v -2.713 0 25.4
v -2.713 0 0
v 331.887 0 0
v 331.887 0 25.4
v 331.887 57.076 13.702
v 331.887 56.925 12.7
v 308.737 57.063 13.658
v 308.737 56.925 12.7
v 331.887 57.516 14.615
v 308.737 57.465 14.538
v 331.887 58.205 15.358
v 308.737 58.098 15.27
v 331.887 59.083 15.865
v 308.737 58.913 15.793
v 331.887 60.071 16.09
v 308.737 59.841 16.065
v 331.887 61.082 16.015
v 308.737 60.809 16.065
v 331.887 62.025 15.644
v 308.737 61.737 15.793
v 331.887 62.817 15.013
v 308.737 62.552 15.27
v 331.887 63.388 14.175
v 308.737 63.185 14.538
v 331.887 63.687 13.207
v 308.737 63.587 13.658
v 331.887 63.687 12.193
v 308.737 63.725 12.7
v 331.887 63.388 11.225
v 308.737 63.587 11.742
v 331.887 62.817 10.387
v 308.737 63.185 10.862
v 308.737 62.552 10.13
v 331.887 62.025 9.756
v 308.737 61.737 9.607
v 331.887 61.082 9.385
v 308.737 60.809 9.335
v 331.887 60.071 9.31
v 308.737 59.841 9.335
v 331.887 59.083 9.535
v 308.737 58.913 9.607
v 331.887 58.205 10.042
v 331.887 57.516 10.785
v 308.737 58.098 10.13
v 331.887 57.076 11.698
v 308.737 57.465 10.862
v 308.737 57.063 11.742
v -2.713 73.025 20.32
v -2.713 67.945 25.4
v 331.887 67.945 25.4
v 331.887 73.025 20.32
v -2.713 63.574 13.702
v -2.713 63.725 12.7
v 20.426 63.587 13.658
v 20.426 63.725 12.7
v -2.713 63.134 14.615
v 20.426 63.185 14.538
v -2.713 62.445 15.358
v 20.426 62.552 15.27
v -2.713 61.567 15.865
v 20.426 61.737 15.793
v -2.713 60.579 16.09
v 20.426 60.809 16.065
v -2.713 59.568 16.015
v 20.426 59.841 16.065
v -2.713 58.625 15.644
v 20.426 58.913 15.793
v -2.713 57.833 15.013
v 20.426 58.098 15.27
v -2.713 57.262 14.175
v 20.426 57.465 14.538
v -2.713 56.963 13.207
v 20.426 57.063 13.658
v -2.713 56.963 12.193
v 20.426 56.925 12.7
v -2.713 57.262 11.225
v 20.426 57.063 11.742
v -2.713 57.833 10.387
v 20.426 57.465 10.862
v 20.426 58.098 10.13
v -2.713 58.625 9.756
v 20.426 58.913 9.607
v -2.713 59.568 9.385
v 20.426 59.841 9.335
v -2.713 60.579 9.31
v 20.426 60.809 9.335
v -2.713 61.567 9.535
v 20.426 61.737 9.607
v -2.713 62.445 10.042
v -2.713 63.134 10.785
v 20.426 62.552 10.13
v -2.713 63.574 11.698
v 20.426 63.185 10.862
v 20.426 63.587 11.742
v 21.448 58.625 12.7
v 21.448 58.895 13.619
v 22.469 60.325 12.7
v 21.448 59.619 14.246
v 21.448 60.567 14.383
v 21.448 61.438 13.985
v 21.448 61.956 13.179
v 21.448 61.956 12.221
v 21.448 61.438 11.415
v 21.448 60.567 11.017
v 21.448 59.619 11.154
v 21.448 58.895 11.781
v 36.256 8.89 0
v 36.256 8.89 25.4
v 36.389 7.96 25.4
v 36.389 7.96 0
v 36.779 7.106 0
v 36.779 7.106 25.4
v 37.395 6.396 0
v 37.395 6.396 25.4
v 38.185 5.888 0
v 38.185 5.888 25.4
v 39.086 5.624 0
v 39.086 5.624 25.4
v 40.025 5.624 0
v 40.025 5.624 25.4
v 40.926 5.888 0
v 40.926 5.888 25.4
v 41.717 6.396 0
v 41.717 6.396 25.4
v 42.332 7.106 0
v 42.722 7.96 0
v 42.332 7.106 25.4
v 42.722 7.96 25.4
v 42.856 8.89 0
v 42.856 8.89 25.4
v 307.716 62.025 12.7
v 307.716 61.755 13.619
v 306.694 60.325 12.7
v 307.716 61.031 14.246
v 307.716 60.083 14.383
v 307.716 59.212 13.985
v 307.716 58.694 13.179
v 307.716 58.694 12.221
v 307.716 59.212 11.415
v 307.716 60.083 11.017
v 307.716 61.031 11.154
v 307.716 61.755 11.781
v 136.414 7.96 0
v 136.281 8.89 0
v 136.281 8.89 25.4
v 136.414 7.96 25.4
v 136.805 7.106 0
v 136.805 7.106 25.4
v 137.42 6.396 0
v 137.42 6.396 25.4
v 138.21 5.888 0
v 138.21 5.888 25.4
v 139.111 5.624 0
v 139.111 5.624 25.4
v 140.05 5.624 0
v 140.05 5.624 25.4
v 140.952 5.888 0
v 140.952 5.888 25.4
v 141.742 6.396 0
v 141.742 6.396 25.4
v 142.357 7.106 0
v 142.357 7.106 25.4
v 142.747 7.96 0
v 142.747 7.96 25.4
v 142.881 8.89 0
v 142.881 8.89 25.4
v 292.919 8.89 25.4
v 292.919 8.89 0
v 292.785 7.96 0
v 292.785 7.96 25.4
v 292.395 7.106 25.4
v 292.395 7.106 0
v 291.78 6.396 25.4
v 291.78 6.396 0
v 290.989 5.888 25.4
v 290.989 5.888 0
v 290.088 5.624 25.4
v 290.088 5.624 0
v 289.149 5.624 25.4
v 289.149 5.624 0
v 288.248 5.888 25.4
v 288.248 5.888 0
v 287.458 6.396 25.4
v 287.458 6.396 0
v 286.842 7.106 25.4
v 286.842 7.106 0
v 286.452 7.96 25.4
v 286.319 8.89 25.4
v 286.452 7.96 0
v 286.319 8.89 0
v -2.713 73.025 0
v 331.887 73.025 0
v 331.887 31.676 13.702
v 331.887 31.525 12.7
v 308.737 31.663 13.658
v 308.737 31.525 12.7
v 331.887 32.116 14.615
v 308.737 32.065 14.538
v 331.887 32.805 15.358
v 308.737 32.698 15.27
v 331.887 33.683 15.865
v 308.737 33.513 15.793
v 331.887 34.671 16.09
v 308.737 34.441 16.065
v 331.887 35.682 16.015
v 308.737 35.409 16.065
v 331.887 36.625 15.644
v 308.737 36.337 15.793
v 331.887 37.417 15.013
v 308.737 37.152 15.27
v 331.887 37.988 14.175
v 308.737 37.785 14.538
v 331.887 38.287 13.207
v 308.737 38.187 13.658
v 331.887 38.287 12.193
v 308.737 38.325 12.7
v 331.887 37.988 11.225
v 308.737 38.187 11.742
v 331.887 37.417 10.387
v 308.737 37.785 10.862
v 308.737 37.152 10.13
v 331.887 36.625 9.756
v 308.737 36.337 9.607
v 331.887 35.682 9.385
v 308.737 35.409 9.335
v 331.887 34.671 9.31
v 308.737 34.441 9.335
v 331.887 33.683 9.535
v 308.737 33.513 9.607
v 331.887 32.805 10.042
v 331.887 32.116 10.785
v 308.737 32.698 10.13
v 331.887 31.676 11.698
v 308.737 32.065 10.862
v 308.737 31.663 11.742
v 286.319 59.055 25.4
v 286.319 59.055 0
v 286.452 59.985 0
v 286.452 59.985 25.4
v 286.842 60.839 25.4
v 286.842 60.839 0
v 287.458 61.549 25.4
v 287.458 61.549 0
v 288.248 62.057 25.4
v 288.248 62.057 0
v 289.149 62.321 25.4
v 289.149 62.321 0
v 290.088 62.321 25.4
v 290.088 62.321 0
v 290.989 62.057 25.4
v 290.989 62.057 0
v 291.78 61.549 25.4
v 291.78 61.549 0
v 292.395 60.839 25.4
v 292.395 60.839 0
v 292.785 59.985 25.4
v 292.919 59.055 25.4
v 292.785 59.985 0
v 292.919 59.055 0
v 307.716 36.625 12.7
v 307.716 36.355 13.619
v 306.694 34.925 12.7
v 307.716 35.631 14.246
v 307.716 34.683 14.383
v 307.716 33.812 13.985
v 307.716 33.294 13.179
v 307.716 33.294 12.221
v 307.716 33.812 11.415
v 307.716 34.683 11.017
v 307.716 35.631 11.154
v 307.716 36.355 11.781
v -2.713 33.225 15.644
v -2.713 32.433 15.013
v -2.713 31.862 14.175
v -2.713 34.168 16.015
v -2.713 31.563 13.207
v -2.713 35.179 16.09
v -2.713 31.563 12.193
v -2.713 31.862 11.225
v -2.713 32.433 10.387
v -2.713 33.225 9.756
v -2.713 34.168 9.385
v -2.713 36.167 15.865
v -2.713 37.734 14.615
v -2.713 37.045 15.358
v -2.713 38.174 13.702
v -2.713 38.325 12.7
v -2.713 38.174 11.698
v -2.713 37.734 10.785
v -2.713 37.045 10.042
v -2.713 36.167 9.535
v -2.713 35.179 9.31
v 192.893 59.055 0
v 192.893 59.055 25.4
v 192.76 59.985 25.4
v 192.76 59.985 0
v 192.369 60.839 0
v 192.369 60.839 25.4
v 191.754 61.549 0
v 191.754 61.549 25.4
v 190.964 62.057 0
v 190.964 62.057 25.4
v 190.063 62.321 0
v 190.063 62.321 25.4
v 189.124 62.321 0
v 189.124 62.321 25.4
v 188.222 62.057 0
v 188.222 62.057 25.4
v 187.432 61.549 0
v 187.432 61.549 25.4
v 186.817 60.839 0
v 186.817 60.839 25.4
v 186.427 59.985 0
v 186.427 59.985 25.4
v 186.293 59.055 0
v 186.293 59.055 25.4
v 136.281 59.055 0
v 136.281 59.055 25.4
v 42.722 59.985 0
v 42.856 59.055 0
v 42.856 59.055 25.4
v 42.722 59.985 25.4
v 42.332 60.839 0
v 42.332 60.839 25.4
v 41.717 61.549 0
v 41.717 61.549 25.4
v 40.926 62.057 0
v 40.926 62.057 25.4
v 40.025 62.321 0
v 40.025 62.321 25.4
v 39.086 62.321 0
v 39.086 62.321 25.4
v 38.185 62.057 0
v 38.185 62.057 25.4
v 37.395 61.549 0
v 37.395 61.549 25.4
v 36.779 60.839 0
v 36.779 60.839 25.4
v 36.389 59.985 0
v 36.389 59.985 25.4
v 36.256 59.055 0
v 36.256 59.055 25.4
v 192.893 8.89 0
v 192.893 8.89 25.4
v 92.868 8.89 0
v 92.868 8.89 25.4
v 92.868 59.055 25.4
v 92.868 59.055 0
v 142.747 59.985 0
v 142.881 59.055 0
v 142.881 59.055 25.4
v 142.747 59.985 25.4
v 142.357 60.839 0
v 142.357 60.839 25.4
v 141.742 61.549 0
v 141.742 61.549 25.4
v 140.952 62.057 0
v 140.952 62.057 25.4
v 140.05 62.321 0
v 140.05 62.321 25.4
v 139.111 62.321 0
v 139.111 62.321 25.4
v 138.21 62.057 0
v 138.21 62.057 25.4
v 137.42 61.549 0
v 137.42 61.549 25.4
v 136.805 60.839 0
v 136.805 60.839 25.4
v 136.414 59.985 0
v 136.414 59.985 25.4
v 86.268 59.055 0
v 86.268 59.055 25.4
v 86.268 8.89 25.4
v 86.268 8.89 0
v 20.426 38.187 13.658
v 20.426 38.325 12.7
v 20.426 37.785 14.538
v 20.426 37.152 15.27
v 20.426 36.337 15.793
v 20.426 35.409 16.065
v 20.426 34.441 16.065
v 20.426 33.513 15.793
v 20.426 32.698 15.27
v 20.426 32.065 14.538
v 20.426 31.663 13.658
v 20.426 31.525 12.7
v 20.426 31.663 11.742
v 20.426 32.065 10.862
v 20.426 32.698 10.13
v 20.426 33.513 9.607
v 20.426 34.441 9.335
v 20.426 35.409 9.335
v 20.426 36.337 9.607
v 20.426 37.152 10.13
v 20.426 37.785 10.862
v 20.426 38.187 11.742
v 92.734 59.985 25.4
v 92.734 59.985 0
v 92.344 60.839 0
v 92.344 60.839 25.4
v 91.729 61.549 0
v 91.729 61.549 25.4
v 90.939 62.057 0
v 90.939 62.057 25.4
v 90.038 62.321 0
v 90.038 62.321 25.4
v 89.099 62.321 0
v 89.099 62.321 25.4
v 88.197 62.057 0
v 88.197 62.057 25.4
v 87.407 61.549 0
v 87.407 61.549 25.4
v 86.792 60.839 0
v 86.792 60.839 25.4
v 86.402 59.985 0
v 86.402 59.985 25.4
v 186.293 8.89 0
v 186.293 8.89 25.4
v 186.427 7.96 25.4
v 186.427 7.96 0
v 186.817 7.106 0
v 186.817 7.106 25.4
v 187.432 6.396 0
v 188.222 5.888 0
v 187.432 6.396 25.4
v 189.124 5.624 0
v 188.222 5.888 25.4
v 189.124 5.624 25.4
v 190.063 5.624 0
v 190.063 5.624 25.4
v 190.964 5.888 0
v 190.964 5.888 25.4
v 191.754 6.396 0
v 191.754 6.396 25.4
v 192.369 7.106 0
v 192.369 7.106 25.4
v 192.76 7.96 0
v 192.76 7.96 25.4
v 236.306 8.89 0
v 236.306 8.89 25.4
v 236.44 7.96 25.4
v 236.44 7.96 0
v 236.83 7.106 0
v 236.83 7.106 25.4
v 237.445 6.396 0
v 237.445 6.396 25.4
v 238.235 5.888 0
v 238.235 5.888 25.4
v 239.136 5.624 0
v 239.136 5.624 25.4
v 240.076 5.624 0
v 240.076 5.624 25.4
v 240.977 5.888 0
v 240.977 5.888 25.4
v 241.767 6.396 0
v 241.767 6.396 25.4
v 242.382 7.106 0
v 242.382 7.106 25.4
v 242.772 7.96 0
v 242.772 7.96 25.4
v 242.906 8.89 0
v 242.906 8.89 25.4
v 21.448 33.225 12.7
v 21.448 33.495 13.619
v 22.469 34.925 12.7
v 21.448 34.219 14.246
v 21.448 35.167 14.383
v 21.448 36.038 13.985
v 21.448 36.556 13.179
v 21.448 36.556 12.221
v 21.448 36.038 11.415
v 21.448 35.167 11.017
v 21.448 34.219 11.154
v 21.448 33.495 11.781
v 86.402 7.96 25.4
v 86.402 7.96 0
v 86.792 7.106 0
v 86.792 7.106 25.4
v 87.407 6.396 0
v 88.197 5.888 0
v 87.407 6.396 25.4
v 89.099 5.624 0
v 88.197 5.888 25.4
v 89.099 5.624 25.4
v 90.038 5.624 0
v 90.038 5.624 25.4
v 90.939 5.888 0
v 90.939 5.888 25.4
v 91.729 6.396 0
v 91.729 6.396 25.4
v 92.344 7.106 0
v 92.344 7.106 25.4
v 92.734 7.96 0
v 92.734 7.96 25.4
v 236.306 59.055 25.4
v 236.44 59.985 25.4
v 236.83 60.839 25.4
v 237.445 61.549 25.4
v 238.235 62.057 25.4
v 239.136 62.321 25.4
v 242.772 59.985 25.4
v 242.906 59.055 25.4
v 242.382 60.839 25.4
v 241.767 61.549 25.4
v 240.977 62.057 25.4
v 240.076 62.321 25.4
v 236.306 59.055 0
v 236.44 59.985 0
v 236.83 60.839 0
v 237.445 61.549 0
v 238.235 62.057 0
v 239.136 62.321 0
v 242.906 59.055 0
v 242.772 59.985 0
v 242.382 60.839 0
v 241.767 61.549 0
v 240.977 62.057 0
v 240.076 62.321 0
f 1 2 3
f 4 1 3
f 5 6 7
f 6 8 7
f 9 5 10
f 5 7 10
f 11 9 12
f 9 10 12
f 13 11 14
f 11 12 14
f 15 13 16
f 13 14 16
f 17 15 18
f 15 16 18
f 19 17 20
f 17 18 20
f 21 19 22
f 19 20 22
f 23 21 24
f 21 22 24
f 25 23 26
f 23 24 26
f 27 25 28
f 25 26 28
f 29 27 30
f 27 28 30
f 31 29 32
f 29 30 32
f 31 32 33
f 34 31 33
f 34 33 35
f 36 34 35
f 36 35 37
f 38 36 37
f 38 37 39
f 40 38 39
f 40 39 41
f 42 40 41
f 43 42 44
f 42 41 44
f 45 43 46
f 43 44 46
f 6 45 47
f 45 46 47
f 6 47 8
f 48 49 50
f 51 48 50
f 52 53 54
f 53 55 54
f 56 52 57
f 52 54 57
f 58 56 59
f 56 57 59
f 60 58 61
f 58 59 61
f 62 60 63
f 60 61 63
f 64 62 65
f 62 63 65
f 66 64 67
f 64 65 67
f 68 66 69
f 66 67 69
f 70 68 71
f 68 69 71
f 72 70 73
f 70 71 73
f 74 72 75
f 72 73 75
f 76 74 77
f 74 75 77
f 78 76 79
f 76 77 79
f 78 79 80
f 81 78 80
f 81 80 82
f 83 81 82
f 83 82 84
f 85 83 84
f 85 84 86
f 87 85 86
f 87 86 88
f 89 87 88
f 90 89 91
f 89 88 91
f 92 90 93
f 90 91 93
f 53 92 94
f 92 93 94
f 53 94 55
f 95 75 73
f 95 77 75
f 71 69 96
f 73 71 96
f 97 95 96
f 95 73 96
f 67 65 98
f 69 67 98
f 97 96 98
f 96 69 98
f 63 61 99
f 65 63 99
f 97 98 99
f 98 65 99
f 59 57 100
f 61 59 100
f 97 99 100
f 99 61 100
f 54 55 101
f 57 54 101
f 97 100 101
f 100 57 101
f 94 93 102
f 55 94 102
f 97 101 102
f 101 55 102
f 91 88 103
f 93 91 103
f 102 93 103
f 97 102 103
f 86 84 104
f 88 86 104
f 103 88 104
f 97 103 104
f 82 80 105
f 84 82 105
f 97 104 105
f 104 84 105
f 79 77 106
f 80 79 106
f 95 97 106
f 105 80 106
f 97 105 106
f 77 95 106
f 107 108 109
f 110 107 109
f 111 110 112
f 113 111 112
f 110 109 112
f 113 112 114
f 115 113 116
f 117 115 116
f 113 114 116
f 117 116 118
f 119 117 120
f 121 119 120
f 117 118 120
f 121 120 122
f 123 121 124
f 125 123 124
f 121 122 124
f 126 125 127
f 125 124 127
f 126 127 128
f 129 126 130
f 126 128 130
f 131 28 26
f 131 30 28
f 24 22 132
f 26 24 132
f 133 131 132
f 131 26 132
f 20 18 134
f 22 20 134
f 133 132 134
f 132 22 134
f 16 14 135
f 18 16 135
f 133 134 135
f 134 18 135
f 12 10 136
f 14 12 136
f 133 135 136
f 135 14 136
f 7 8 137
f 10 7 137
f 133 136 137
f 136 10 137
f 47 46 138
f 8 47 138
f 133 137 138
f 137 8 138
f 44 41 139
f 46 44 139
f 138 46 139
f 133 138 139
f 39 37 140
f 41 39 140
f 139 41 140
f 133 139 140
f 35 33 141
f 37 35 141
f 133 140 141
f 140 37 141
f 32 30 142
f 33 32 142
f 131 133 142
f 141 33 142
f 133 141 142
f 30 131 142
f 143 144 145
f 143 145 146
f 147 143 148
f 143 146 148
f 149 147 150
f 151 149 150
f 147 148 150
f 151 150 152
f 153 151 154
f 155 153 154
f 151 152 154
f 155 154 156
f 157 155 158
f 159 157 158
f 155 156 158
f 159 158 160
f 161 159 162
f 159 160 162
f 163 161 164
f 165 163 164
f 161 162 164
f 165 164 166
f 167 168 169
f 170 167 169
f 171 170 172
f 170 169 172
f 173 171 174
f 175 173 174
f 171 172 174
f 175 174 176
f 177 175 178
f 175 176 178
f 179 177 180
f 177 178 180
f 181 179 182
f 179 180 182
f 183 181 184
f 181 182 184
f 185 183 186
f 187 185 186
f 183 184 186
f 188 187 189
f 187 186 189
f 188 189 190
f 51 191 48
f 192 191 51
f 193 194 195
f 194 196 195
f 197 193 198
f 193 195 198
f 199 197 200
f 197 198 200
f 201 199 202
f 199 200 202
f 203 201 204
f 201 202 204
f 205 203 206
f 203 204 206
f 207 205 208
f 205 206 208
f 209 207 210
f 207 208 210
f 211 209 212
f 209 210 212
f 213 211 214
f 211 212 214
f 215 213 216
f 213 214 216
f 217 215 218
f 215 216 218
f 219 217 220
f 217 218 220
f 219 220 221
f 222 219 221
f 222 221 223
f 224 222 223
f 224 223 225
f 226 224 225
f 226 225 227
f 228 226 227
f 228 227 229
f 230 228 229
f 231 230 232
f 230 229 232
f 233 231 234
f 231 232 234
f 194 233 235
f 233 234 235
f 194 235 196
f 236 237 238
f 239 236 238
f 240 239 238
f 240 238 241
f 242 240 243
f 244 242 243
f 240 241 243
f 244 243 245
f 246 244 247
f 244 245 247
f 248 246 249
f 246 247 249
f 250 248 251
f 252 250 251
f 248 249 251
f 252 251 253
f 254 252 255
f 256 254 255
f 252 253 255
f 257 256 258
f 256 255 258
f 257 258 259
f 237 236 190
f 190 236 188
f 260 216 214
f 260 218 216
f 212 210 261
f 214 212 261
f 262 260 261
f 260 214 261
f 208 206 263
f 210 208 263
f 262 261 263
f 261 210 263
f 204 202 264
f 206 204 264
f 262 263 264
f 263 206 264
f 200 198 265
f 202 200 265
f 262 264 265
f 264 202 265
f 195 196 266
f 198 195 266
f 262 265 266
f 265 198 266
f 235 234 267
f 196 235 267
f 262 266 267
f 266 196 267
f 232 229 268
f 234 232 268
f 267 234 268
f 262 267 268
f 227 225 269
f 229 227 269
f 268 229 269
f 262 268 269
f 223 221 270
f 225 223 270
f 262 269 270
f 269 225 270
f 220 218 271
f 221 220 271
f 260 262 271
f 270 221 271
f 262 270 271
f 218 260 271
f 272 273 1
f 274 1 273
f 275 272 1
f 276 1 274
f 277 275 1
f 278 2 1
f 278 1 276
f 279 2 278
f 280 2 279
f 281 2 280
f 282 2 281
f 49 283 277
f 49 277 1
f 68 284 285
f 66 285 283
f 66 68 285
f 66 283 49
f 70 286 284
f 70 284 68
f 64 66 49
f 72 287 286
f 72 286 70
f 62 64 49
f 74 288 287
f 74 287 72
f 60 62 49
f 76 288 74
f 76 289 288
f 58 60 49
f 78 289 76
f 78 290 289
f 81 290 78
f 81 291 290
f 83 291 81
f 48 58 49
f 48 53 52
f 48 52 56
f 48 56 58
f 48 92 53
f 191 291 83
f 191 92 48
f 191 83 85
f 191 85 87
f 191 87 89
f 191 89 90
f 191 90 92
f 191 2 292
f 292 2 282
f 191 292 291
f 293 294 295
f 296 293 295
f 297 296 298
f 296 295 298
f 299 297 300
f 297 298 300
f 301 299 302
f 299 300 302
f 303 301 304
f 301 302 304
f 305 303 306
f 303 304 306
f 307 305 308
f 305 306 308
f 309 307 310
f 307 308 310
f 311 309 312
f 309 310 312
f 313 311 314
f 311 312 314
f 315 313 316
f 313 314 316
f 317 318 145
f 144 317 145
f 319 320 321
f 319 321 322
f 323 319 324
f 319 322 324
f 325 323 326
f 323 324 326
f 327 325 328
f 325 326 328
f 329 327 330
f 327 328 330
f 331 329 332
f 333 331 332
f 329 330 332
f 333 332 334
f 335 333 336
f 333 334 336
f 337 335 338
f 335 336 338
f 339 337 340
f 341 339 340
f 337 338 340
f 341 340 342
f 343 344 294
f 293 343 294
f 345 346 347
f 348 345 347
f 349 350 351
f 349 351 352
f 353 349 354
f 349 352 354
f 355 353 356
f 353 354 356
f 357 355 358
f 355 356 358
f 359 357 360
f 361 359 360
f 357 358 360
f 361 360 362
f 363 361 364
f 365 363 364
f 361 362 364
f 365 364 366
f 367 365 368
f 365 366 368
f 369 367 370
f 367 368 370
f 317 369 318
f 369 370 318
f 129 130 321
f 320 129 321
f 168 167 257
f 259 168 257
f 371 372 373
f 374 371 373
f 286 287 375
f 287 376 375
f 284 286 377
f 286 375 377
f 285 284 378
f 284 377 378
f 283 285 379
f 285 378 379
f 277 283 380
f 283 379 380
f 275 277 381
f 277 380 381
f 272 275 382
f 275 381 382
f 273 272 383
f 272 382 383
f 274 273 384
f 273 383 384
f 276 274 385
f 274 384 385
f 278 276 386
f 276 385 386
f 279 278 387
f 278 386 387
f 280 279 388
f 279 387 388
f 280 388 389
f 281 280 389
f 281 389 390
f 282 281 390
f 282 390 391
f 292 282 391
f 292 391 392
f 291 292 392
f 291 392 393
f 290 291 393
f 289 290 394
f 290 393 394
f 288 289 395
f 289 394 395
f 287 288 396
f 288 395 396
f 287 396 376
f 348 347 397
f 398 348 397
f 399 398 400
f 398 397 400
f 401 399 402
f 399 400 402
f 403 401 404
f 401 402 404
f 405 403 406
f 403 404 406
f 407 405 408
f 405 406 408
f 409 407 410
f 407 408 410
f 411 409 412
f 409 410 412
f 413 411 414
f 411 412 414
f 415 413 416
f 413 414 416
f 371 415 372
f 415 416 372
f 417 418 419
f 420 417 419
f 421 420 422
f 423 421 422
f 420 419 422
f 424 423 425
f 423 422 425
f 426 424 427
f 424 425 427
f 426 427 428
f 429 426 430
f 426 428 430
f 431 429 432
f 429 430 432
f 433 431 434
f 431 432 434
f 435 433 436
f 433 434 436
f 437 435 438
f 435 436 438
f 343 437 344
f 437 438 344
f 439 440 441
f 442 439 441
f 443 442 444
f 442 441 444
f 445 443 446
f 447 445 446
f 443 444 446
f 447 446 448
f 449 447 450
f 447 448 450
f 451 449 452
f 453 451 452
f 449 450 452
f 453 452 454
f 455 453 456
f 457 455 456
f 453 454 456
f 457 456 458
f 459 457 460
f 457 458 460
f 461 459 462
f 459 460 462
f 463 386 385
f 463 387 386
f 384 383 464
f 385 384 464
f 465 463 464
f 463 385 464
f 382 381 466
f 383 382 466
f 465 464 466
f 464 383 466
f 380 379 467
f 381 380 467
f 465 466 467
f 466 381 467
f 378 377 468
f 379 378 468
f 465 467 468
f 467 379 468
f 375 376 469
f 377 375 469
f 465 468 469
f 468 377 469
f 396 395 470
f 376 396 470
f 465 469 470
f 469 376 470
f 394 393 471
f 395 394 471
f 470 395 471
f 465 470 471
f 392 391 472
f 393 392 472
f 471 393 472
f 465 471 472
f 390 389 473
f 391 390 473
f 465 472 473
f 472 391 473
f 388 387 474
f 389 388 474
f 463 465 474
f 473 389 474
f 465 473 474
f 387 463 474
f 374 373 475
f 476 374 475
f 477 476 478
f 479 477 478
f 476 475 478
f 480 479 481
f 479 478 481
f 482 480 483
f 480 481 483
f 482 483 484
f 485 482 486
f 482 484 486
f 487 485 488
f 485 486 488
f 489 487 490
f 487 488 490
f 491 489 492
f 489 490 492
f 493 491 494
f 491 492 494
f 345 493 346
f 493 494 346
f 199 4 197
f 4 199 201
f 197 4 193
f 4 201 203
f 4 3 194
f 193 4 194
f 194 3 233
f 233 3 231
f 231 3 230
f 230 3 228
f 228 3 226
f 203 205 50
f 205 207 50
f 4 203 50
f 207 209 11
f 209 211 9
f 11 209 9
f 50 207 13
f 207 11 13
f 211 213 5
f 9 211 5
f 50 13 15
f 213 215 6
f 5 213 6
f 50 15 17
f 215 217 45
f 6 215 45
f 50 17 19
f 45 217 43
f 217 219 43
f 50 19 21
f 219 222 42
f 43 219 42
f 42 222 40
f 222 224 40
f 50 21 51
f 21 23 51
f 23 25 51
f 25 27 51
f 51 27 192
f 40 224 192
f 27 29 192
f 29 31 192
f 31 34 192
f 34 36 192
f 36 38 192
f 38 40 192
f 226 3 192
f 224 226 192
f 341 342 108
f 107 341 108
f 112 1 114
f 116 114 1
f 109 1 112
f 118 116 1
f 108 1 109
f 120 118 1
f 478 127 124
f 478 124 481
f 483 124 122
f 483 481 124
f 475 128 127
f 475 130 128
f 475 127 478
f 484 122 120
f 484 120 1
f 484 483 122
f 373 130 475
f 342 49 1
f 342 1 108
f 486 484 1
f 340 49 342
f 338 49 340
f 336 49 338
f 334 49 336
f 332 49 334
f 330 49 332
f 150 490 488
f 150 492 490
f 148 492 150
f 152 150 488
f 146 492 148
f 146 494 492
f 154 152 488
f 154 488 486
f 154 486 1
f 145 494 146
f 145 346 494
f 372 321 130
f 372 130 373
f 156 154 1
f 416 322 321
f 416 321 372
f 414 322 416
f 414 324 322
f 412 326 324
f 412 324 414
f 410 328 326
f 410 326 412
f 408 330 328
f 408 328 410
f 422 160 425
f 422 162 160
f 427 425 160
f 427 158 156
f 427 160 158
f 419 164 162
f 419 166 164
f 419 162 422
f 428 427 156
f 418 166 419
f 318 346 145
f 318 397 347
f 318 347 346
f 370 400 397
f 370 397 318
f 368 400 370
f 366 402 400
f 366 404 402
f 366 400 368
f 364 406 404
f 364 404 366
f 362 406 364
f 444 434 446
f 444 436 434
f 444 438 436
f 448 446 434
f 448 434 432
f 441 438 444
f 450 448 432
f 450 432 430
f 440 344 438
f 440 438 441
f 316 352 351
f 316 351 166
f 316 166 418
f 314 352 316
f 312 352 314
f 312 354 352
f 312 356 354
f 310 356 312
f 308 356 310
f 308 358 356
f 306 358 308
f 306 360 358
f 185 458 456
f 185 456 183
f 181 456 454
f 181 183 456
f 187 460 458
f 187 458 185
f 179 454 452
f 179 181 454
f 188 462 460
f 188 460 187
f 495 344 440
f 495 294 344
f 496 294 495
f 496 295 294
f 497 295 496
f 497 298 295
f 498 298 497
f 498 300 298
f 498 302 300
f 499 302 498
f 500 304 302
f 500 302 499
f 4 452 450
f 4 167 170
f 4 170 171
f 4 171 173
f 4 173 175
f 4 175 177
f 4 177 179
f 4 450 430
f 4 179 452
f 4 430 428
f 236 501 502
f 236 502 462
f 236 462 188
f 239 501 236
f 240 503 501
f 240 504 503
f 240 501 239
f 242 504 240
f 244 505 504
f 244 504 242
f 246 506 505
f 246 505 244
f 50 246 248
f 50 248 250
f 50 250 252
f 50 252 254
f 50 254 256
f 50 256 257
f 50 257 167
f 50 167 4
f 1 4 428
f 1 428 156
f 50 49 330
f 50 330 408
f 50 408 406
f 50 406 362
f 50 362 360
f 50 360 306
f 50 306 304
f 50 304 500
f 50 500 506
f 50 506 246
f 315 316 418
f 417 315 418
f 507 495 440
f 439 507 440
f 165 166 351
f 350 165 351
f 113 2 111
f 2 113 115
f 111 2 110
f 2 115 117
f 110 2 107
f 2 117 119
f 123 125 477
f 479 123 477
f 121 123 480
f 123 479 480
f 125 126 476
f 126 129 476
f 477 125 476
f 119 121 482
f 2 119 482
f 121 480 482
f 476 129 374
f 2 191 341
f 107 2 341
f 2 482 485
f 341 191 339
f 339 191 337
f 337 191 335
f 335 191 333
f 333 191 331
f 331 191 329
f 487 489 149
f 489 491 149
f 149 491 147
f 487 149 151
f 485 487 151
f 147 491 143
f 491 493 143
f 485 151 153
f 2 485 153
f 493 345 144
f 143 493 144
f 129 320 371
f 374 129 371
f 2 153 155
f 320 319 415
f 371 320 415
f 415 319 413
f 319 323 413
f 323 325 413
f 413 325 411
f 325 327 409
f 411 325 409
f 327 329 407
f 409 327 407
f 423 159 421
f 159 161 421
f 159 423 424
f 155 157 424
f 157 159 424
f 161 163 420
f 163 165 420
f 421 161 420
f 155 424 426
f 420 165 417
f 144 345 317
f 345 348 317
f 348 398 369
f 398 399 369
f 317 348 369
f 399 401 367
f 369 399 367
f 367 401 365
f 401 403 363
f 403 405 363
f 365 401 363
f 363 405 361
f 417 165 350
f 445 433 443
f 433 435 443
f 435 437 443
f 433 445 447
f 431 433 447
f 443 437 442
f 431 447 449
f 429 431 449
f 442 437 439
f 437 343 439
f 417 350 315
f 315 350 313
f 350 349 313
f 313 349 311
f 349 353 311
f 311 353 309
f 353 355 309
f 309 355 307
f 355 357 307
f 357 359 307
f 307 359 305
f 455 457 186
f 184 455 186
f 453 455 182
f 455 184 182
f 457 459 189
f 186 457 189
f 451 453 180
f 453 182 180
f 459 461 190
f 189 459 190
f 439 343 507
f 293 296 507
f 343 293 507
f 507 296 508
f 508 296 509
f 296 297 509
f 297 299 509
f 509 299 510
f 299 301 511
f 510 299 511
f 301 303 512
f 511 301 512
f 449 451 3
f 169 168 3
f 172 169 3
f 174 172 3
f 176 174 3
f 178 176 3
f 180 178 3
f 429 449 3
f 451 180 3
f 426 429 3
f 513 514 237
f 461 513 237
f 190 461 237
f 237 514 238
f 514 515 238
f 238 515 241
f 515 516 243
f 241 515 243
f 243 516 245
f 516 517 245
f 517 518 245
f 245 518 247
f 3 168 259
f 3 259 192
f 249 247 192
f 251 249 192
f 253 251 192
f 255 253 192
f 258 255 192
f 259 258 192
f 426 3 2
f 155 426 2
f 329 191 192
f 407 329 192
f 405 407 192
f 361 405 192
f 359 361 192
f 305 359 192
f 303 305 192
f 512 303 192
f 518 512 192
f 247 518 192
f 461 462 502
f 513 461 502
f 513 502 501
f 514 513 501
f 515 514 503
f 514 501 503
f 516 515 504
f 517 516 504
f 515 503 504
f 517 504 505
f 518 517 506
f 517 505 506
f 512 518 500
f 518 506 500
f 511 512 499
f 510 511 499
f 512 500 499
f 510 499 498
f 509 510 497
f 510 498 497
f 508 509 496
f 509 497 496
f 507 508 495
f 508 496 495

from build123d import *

# Parameters (mm, degrees)
F0_W      = 334.6
F0_H      = 73.025
F1_DEPTH  = 25.4
F2_SIZE   = 5.08
F4_D      = 6.8
F4_DEPTH  = 23.15
F4_TIP    = 2.0429261047
F6_D      = 6.8
F6_DEPTH  = 23.1394
F6_TIP    = 2.0429261047
F8_D      = 6.6
F10_DEPTH = 25.4
F12_DEPTH = 25.4


# Not quite as in the source:
# - a feature names something its author has since deleted; it is built from what else it names


with BuildPart() as f1:
    # F0 (on Top) → F1 (new body)
    with BuildSketch(Plane.XY):
        with Locations((164.5870582715, 36.5125)):
            Rectangle(F0_W, F0_H)
    extrude(amount=F1_DEPTH)

    # F2
    f2_edges = [f1.edges().sort_by_distance(p)[0] for p in [
        (164.587058, 73.025, 25.4),
    ]]
    chamfer(f2_edges, length=F2_SIZE)

    # F4
    with Locations(Plane.YZ.offset(331.8870582715)):
        with Locations((34.925, 12.7), (60.325, 12.7)):
            Hole(F4_D / 2, depth=F4_DEPTH)
            with Locations((0, 0, -(F4_DEPTH + F4_TIP / 2))):  # 118° drill point
                Cone(0, F4_D / 2, F4_TIP, mode=Mode.SUBTRACT)

    # F6
    with Locations(Plane(origin=(-2.7129417285, 0, 0), x_dir=(0, -1, 0), z_dir=(-1, 0, 0))):
        with Locations((-60.325, 12.7), (-34.925, 12.7)):
            Hole(F6_D / 2, depth=F6_DEPTH)
            with Locations((0, 0, -(F6_DEPTH + F6_TIP / 2))):  # 118° drill point
                Cone(0, F6_D / 2, F6_TIP, mode=Mode.SUBTRACT)

    # F8 (through all)
    with Locations(Plane.XY.offset(25.4)):
        with Locations((289.6185582715, 8.89), (289.6185582715, 59.055)):
            Hole(F8_D / 2)

    # F9 (on face) → F10 (cut)
    with BuildSketch(Plane.XY.offset(25.4)):
        with BuildLine():
            ThreePointArc((286.3185582715, 8.89), (289.6185582715, 12.19), (292.9185582715, 8.89))
            Line((292.9185582715, 8.89), (292.9185582715, 59.055))
            ThreePointArc((292.9185582715, 59.055), (289.6185582715, 55.755), (286.3185582715, 59.055))
            Line((286.3185582715, 59.055), (286.3185582715, 8.89))
        make_face()
    extrude(amount=-F10_DEPTH, mode=Mode.SUBTRACT)

    # F11 (on face) → F12 (cut)
    with BuildSketch(Plane.XY.offset(25.4)):
        with BuildLine():
            ThreePointArc((236.3059582715, 8.89), (239.6059582715, 5.59), (242.9059582715, 8.89))
            Line((242.9059582715, 8.89), (242.9059582715, 59.055))
            ThreePointArc((242.9059582715, 59.055), (239.6059582715, 62.355), (236.3059582715, 59.055))
            Line((236.3059582715, 59.055), (236.3059582715, 8.89))
        make_face()
        with BuildLine():
            ThreePointArc((186.2933582715, 8.89), (189.5933582715, 5.59), (192.8933582715, 8.89))
            Line((192.8933582715, 8.89), (192.8933582715, 59.055))
            ThreePointArc((192.8933582715, 59.055), (189.5933582715, 62.355), (186.2933582715, 59.055))
            Line((186.2933582715, 59.055), (186.2933582715, 8.89))
        make_face()
        with BuildLine():
            ThreePointArc((136.2807582715, 8.89), (139.5807582715, 5.59), (142.8807582715, 8.89))
            Line((142.8807582715, 8.89), (142.8807582715, 59.055))
            ThreePointArc((142.8807582715, 59.055), (139.5807582715, 62.355), (136.2807582715, 59.055))
            Line((136.2807582715, 59.055), (136.2807582715, 8.89))
        make_face()
        with BuildLine():
            ThreePointArc((86.2681582715, 8.89), (89.5681582715, 5.59), (92.8681582715, 8.89))
            Line((92.8681582715, 8.89), (92.8681582715, 59.055))
            ThreePointArc((92.8681582715, 59.055), (89.5681582715, 62.355), (86.2681582715, 59.055))
            Line((86.2681582715, 59.055), (86.2681582715, 8.89))
        make_face()
        with BuildLine():
            ThreePointArc((36.2555582715, 8.89), (39.5555582715, 5.59), (42.8555582715, 8.89))
            Line((42.8555582715, 8.89), (42.8555582715, 59.055))
            ThreePointArc((42.8555582715, 59.055), (39.5555582715, 62.355), (36.2555582715, 59.055))
            Line((36.2555582715, 59.055), (36.2555582715, 8.89))
        make_face()
    extrude(amount=-F12_DEPTH, mode=Mode.SUBTRACT)


solid = f1.part
